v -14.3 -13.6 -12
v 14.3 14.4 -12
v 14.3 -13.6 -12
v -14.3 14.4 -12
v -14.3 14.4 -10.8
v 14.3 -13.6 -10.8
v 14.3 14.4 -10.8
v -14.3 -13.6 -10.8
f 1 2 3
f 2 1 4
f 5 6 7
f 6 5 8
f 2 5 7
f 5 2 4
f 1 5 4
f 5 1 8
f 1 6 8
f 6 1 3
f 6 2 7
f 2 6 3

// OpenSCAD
// file: ../p/box.scad
use <../lib.scad>
function ldraw_lib__box() = [
// 0 Box 6 (six faces)
// 0 Name: box.dat
// 0 Author: James Jessiman
// 0 !LDRAW_ORG Primitive UPDATE 2002-05
// 0 !LICENSE Licensed under CC BY 2.0 and CC BY 4.0 : see CAreadme.txt
// 
// 0 BFC CERTIFY CCW
  [0,"BFC","CERTIFY"],
  [0,"BFC","CCW"],
// 
// 0 !HISTORY 2002-08-22 [sbliss] Applied BFC
// 0 !HISTORY 2002-11-30 [PTadmin] Official Update 2002-05
// 0 !HISTORY 2007-06-24 [PTadmin] Header formatted for Contributor Agreement
// 0 !HISTORY 2008-07-01 [PTadmin] Official Update 2008-01
// 
// 
// 2 24 1 1 1 -1 1 1
  [2,24,1,1,1,-1,1,1],
// 2 24 -1 1 1 -1 1 -1
  [2,24,-1,1,1,-1,1,-1],
// 2 24 -1 1 -1 1 1 -1
  [2,24,-1,1,-1,1,1,-1],
// 2 24 1 1 -1 1 1 1
  [2,24,1,1,-1,1,1,1],
// 2 24 1 -1 1 -1 -1 1
  [2,24,1,-1,1,-1,-1,1],
// 2 24 -1 -1 1 -1 -1 -1
  [2,24,-1,-1,1,-1,-1,-1],
// 2 24 -1 -1 -1 1 -1 -1
  [2,24,-1,-1,-1,1,-1,-1],
// 2 24 1 -1 -1 1 -1 1
  [2,24,1,-1,-1,1,-1,1],
// 2 24 1 -1 1 1 1 1
  [2,24,1,-1,1,1,1,1],
// 2 24 -1 -1 1 -1 1 1
  [2,24,-1,-1,1,-1,1,1],
// 2 24 1 -1 -1 1 1 -1
  [2,24,1,-1,-1,1,1,-1],
// 2 24 -1 -1 -1 -1 1 -1
  [2,24,-1,-1,-1,-1,1,-1],
// 4 16 1 1 1 1 1 -1 -1 1 -1 -1 1 1
  [4,16,1,1,1,1,1,-1,-1,1,-1,-1,1,1],
// 4 16 -1 -1 -1 1 -1 -1 1 -1 1 -1 -1 1
  [4,16,-1,-1,-1,1,-1,-1,1,-1,1,-1,-1,1],
// 4 16 -1 -1 1 1 -1 1 1 1 1 -1 1 1
  [4,16,-1,-1,1,1,-1,1,1,1,1,-1,1,1],
// 4 16 -1 -1 -1 -1 -1 1 -1 1 1 -1 1 -1
  [4,16,-1,-1,-1,-1,-1,1,-1,1,1,-1,1,-1],
// 4 16 1 -1 -1 -1 -1 -1 -1 1 -1 1 1 -1
  [4,16,1,-1,-1,-1,-1,-1,-1,1,-1,1,1,-1],
// 4 16 1 -1 1 1 -1 -1 1 1 -1 1 1 1
  [4,16,1,-1,1,1,-1,-1,1,1,-1,1,1,1],
// 0
];
module ldraw_lib__box(step=0, col=false, unit=2/5, alt=false, line=0.2, solid=!$preview)
    makepoly(ldraw_lib__box(), step=step, col=col, unit=unit, alt=alt, line=line, solid=solid);
ldraw_lib__box(line=0.2);
// main file
use <../lib.scad>
use <../p/box.scad>
function ldraw_lib__842() = [
// 0 Homemaker Stove Shelf  4 x  4
// 0 Name: 842.dat
// 0 Author: Arne Hackstein
// 0 !LDRAW_ORG Part UPDATE 2018-02
// 0 !LICENSE Licensed under CC BY 2.0 and CC BY 4.0 : see CAreadme.txt
// 
// 0 BFC CERTIFY CCW
  [0,"BFC","CERTIFY"],
  [0,"BFC","CCW"],
// 
// 0 !HISTORY 1998-04-11 [PTadmin] Official Update 1998-04
// 0 !HISTORY 2007-07-23 [PTadmin] Header formatted for Contributor Agreement
// 0 !HISTORY 2008-07-01 [PTadmin] Official Update 2008-01
// 0 !HISTORY 2017-09-24 [MagFors] bfc'd
// 0 !HISTORY 2018-12-08 [PTadmin] Official Update 2018-02
// 
// 
// 1 16 0 28.5 1 35.75 0 0 0 1.5 0 0 0 35 box.dat
  [1,16,0,28.5,1,35.75,0,0,0,1.5,0,0,0,35, ldraw_lib__box()],
];
module ldraw_lib__842(step=0, col=false, unit=2/5, alt=false, line=0.2, solid=!$preview)
    makepoly(ldraw_lib__842(), step=step, col=col, unit=unit, alt=alt, line=line, solid=solid);
ldraw_lib__842(line=0.2);
